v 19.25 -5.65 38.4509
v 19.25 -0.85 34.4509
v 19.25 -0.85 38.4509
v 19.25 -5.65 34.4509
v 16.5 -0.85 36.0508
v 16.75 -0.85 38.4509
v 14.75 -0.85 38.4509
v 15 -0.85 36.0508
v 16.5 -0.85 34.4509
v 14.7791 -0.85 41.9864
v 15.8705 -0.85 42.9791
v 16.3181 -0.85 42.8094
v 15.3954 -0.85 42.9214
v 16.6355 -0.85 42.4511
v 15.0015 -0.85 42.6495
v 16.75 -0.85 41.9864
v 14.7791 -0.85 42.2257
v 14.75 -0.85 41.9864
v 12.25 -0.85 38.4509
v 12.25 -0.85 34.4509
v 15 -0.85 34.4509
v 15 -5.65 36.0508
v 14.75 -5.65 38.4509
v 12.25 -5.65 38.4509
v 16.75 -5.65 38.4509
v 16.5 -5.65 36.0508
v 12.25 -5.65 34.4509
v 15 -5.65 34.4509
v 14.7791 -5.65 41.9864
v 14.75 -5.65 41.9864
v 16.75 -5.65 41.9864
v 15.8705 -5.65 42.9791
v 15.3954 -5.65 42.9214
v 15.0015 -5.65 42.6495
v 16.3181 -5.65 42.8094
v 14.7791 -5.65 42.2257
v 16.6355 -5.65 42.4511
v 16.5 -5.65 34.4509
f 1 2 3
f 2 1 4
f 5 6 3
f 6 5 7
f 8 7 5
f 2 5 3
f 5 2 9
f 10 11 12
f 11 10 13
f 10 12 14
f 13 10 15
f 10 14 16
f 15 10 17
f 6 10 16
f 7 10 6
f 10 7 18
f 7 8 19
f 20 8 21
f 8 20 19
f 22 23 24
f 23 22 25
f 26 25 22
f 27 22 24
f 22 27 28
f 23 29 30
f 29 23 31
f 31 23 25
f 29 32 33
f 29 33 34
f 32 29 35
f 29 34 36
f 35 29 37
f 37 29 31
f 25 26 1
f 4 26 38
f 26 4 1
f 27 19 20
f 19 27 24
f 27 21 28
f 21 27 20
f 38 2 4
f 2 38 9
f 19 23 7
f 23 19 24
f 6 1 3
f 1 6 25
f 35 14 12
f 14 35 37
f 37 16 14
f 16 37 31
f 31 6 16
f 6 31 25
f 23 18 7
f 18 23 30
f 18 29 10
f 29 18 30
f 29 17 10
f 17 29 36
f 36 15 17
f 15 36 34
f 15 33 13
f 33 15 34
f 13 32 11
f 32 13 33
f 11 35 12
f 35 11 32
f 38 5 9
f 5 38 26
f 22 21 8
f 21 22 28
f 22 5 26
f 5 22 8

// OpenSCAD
// file: vars.scad
/*
osab-enclosure.scad - the OSAB enclosure.

OSAB - the Open Source Audio Bible player.

Copyright (C) 2011-2022 Theophilus (http://theaudiobible.org)

Permission is hereby granted, free of charge, to any person obtaining a copy of this software and associated documentation files (the "Software"), to deal in the Software without restriction, including without limitation the rights to use, copy, modify, merge, publish, distribute, sublicense, and/or sell copies of the Software, and to permit persons to whom the Software is furnished to do so, subject to the following conditions:

The above copyright notice and this permission notice shall be included in all copies or substantial portions of the Software.

THE SOFTWARE IS PROVIDED "AS IS", WITHOUT WARRANTY OF ANY KIND, EXPRESS OR IMPLIED, INCLUDING BUT NOT LIMITED TO THE WARRANTIES OF MERCHANTABILITY, FITNESS FOR A PARTICULAR PURPOSE AND NONINFRINGEMENT. IN NO EVENT SHALL THE AUTHORS OR COPYRIGHT HOLDERS BE LIABLE FOR ANY CLAIM, DAMAGES OR OTHER LIABILITY, WHETHER IN AN ACTION OF CONTRACT, TORT OR OTHERWISE, ARISING FROM, OUT OF OR IN CONNECTION WITH THE SOFTWARE OR THE USE OR OTHER DEALINGS IN THE SOFTWARE.
*/


$fa=0.5; // default minimum facet angle is now 0.5
$fs=0.5; // default minimum facet size is now 0.5 mm

nozzle_diam = 0.35; // 3D printer nozzle diameter

thickness = 2;
pcb_width = 50;
height = 12;
width = pcb_width;
length = width*(1+sqrt(5))/2;
pcb_length = length - 3*thickness;
pcb_thickness = 1.0;
hole_depth = 8*thickness;
shim = 0.2;  // Set to layer height
radius = 5;
center = width/2;
dimple = 1.2;
speaker_top_diam = 16;
speaker_mid_diam = 28.0;
speaker_bot_diam = 30.5;
speaker_top_ht = 1.5;
speaker_mid_ht = 1.1;
speaker_bot_ht = 2.4;
speaker_hole_diameter = 2;
speaker_hole_height = 4*thickness;
cat_button_x = 15;
cat_button_y = 17;
vol_button_x = 15;
vol_button_y = 17;
switch_height = 1.5;
//button_height = 9 - 2*switch_height - shim;
button_height = 4;
button_gap = 14;
strip_width = 3;
strip_height = 1;
earphone_diam = 5 + 2*shim;
earphone_height = 2.3;
earphone_to_pcb_right = 19.25;
usb_width = 9;
usb_height = 3.2;
pinhole_diameter = 1.2;
lock_hole_width = 4.2;
lock_lever_altitude = 0.4;
lock_lever_depth = 1.5;
lock_lever_width = 1.3;
lock_ext_depth = 4;
lock_ext_thickness = (height - pcb_thickness)/2;
lock_ext_width = 7;
lock_ext_lever_width = 2;
lock_ext_lever_length = 4;
lock_support_width = 15;
lock_support_thickness = 1;
lock_support_height = height/2 - pcb_thickness/2 - lock_ext_thickness/2;
text_depth = 1;
holder_width = 15.35;
holder_length = 14.5;
holder_height = 2.45;
card_width = 11.05;
card_length = 2.65;
card_height = 1.00;
tongue_length = 20;
tongue_width = 4;
tongue_thickness = 4;
tongue_hole_diam = 2;
groove_diam = 1.5;
groove_width = 1.1*tongue_width;
// main file
/*
osab-enclosure.scad - the OSAB enclosure.

OSAB - the Open Source Audio Bible player.

Copyright (C) 2011-2022 Theophilus (http://theaudiobible.org)

Permission is hereby granted, free of charge, to any person obtaining a copy of this software and associated documentation files (the "Software"), to deal in the Software without restriction, including without limitation the rights to use, copy, modify, merge, publish, distribute, sublicense, and/or sell copies of the Software, and to permit persons to whom the Software is furnished to do so, subject to the following conditions:

The above copyright notice and this permission notice shall be included in all copies or substantial portions of the Software.

THE SOFTWARE IS PROVIDED "AS IS", WITHOUT WARRANTY OF ANY KIND, EXPRESS OR IMPLIED, INCLUDING BUT NOT LIMITED TO THE WARRANTIES OF MERCHANTABILITY, FITNESS FOR A PARTICULAR PURPOSE AND NONINFRINGEMENT. IN NO EVENT SHALL THE AUTHORS OR COPYRIGHT HOLDERS BE LIABLE FOR ANY CLAIM, DAMAGES OR OTHER LIABILITY, WHETHER IN AN ACTION OF CONTRACT, TORT OR OTHERWISE, ARISING FROM, OUT OF OR IN CONNECTION WITH THE SOFTWARE OR THE USE OR OTHER DEALINGS IN THE SOFTWARE.
*/


include <vars.scad>;


rotate([-90, 0, 0])
translate([(lock_hole_width-lock_ext_lever_width-2*nozzle_diam)/2+width*3/10, lock_ext_depth-length/2, -(lock_ext_thickness+pcb_thickness)/2])
  difference() {
    union() {
      cube([lock_ext_width, lock_ext_depth, lock_ext_thickness-2*nozzle_diam], true);
      translate([0, -radius/sqrt(2), 0])
        linear_extrude(height=lock_ext_thickness-2*nozzle_diam, center=true, convexity=10, twist=0, scale=1)
        union() {
          square([lock_ext_lever_width, lock_ext_lever_length], true);
          translate([0, -lock_ext_lever_length/2, 0])
            circle(d=lock_ext_lever_width);
        }
    }
    translate([0, (lock_ext_depth-lock_lever_depth)/2, 0])
      cube([lock_lever_width+shim, lock_lever_depth+shim, lock_ext_thickness+shim], true);
}
